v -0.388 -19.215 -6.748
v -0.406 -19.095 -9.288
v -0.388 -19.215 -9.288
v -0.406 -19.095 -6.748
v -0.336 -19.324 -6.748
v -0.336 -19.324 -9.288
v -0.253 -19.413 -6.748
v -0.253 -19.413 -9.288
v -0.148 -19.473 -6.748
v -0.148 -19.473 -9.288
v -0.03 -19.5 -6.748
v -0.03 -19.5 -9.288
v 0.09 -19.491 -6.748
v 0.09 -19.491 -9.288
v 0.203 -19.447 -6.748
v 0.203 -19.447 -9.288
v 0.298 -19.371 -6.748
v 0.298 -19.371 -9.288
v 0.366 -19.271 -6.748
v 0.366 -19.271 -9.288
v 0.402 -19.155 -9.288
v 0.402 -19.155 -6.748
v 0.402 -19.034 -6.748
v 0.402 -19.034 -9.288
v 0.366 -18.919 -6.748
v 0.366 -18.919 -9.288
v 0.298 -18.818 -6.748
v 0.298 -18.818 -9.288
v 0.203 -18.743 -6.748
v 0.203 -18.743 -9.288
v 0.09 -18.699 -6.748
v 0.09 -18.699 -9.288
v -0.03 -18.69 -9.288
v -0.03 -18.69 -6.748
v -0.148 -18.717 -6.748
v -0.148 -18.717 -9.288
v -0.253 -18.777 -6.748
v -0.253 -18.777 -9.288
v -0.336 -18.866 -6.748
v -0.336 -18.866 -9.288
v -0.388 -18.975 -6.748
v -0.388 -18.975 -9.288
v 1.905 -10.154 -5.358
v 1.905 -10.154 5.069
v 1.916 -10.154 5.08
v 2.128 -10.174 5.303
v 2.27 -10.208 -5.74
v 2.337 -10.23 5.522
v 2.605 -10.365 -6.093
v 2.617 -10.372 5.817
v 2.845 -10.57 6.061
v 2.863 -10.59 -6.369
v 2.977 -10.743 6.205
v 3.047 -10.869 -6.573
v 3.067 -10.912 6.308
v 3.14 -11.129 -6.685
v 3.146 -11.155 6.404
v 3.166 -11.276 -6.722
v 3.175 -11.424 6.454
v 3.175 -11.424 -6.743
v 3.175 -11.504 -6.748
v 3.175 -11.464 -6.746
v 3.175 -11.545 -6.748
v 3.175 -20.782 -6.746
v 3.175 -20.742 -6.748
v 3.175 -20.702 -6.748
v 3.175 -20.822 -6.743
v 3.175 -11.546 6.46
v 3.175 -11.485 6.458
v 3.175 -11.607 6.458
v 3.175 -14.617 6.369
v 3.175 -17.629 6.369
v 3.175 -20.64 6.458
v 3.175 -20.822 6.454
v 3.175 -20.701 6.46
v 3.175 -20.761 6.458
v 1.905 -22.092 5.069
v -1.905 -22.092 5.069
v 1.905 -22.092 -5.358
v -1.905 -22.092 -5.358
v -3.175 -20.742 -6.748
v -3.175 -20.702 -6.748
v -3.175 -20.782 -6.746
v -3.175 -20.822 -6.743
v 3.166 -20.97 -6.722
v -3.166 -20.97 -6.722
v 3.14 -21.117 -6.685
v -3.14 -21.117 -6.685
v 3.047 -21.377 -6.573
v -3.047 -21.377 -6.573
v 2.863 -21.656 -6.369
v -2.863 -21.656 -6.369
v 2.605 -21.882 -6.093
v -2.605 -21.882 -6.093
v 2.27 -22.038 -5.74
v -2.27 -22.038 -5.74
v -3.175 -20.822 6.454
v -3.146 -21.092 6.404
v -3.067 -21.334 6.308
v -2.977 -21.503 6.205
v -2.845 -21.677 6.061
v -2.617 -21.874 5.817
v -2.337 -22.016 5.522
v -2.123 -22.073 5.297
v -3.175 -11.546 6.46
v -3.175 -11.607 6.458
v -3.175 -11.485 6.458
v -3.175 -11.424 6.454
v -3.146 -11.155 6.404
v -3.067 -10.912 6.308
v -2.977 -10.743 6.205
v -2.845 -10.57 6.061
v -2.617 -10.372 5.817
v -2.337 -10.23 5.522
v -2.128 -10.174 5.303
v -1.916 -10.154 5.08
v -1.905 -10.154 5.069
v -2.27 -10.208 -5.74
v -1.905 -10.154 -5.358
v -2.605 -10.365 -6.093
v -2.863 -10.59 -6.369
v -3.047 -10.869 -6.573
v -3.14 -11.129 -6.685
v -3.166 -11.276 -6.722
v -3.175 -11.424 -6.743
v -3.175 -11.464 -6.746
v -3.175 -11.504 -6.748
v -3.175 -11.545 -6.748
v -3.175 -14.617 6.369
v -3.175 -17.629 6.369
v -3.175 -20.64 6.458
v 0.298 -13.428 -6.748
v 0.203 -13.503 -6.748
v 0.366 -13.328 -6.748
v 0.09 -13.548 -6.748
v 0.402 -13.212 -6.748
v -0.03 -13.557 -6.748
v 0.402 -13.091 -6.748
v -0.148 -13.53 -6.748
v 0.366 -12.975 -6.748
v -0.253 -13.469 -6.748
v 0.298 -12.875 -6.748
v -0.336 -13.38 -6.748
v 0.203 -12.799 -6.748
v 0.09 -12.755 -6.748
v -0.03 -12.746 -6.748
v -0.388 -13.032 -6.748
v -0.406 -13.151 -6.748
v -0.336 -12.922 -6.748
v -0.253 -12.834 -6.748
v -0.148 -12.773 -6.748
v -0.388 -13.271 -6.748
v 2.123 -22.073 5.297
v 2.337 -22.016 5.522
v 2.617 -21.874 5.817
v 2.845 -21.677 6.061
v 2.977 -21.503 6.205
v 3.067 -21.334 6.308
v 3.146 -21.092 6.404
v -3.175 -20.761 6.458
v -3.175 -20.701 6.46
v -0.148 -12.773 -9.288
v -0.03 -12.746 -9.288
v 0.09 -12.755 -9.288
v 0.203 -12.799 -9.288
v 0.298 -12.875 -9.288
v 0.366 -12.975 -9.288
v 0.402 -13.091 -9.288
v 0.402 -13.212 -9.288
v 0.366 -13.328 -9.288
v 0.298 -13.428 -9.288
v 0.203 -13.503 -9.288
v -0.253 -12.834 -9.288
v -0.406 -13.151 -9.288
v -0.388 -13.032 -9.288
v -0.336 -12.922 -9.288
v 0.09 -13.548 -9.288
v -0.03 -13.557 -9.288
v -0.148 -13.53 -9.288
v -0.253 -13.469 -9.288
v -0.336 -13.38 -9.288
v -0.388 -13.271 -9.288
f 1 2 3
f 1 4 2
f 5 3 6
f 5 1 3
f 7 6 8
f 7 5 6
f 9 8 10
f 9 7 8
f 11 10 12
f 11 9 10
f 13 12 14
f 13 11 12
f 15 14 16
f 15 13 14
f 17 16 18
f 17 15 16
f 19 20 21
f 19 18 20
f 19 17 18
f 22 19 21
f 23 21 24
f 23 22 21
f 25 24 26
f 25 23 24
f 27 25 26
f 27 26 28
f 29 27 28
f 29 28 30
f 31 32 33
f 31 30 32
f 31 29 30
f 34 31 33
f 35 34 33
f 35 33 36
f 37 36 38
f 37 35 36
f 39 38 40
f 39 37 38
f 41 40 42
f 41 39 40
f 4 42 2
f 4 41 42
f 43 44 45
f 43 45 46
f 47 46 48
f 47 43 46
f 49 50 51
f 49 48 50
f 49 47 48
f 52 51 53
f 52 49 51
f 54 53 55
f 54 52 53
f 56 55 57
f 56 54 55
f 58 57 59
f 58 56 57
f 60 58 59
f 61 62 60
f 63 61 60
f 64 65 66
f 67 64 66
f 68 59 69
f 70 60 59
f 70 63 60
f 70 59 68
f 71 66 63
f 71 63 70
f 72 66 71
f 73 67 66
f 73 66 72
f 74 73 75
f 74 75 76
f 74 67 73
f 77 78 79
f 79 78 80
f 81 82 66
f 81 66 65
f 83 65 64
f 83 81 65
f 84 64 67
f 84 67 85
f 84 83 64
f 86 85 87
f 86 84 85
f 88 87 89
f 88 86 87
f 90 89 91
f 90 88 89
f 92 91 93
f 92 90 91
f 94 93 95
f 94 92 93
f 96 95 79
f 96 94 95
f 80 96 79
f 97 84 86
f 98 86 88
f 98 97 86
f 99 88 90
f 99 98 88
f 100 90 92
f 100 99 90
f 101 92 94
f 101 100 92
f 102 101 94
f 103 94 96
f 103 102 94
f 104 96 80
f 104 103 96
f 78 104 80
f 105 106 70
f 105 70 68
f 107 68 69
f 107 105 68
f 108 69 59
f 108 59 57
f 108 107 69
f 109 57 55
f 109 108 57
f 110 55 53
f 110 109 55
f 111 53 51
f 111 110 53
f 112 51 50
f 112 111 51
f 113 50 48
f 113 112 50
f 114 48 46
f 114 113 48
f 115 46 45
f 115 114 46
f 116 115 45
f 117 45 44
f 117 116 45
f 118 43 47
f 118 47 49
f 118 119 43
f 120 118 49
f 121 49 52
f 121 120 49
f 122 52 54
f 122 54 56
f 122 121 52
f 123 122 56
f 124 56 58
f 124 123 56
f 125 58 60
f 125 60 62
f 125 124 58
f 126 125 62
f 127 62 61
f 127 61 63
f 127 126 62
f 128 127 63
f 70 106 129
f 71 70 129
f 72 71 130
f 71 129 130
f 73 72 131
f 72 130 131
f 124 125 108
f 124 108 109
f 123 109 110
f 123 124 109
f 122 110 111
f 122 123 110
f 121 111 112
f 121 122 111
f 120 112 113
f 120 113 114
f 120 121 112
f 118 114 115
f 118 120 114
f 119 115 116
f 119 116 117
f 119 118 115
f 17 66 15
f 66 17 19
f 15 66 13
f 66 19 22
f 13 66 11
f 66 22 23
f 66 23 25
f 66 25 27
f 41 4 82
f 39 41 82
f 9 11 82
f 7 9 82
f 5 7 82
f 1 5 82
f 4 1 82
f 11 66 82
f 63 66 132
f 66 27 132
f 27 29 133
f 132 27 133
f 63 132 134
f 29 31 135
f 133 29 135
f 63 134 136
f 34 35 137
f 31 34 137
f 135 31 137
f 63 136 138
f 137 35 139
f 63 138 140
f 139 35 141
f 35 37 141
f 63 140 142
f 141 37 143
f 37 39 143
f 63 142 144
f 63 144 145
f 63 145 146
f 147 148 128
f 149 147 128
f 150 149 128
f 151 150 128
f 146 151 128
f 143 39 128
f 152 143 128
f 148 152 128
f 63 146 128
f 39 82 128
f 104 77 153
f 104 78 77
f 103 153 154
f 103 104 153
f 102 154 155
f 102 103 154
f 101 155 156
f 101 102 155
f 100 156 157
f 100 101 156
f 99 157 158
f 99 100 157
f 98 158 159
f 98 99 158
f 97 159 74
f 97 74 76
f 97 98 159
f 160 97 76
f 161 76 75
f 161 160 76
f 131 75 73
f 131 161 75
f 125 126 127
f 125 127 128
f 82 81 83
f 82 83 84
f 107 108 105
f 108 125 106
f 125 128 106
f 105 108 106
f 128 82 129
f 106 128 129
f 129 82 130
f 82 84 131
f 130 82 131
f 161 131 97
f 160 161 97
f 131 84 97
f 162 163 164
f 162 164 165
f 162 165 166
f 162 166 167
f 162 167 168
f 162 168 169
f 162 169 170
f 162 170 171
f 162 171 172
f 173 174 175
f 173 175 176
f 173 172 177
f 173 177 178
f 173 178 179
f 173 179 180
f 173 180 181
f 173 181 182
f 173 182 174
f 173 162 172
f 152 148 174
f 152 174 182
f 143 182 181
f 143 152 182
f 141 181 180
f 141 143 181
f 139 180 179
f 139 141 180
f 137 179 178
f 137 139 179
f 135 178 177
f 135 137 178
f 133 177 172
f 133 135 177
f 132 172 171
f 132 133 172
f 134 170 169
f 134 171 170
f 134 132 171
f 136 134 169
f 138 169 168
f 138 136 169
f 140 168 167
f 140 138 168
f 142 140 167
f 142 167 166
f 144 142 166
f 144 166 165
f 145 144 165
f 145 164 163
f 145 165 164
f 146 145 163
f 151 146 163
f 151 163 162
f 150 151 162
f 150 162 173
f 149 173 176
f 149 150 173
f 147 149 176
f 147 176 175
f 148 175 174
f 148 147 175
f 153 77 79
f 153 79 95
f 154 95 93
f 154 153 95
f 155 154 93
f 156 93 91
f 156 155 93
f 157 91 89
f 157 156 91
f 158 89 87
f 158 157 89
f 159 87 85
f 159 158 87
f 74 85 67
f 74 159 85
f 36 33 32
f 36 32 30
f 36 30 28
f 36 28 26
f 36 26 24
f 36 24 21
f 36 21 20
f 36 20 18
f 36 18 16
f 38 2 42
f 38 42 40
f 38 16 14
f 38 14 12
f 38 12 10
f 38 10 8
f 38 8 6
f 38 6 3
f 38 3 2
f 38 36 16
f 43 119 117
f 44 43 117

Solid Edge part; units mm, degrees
sketch "Sketch1" plane through (0, 0, 0) normal (1, 0, 0) x (0, 1, 0)
  line L0 (-22.0921, 5.0691) -> (-22.0921, -5.3577)
  arc A0 (-22.0921, -5.3577) -> (-20.7015, -6.7483) centre (-20.7015, -5.3577) ccw
  line L1 (-20.7015, -6.7483) -> (-11.5447, -6.7483)
  arc A1 (-10.1541, -5.3577) -> (-11.5447, -6.7483) centre (-11.5447, -5.3577) cw
  line L2 (-10.1541, -5.3577) -> (-10.1541, 5.0691)
  arc A2 (-11.6065, 6.4583) -> (-10.1541, 5.0691) centre (-11.5447, 5.0691) cw
  arc A3 (-20.6397, 6.4583) -> (-22.0921, 5.0691) centre (-20.7015, 5.0691) ccw
  arc A4 (-11.6065, 6.4583) -> (-20.6397, 6.4583) centre (-16.1231, 107.9579) cw
extrude "Protrusion1" add sketch "Sketch1" along normal mid plane 6.35
fillet "Round_1" radius 1.27 4 edges at (3.175, -22.0921, -0.1443) (-3.175, -22.0921, -0.1443) (3.175, -10.1541, -0.1443) (-3.175, -10.1541, -0.1443)
sketch "Sketch2" plane through (0, -11.6781, -6.7483) normal (0, 0, -1) x (-1, 0, 0)
  circle A0 centre (0, -1.4732) radius 0.4064
  circle A1 centre (0, -7.4168) radius 0.4064
  dimension "D1" = 5.9436
extrude "ExtrudedProtrusion_2" add sketch "Sketch2" along normal blind 2.54
